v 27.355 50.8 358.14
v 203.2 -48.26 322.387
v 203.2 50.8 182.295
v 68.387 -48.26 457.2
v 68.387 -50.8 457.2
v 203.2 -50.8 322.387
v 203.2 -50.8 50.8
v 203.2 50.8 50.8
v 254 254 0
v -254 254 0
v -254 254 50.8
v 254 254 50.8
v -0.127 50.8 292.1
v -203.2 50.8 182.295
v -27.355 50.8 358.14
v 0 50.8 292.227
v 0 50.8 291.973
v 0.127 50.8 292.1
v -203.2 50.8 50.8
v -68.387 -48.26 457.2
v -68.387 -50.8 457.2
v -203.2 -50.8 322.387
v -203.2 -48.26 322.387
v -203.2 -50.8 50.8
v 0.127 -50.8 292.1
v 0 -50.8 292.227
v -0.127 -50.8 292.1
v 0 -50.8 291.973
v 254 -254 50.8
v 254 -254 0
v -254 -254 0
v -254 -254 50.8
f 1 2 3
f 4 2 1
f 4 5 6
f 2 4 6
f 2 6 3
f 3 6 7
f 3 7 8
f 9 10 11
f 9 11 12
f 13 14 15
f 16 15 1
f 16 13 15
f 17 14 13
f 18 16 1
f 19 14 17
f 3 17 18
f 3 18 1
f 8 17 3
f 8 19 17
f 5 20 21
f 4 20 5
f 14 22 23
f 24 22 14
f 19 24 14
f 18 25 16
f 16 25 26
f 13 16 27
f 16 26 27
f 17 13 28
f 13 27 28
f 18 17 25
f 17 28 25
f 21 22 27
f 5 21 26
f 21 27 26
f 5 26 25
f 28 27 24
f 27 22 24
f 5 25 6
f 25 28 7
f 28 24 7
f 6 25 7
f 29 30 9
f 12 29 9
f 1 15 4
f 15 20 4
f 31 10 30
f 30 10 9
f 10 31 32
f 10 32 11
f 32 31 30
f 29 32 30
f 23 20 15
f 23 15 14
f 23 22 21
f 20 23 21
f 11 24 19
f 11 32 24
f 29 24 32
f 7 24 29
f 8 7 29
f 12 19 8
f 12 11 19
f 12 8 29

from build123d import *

# Parameters (mm, degrees)
F3_W      = 508
F3_H      = 508
F4_DEPTH  = 50.8
F5_W      = 406.4
F5_H      = 101.6
F6_DEPTH  = 406.4
F8_DEPTH  = 304.801
F9_SIZE   = 99.06
F10_SIZE  = 99.06
F15_R     = 0.127
F16_DEPTH = 304.801


with BuildPart() as f4:
    # F3 (on Top) → F4 (new body)
    with BuildSketch(Plane.XY):
        Rectangle(F3_W, F3_H)
    extrude(amount=F4_DEPTH)

    # F5 (on face) → F6 (join)
    with BuildSketch(Plane.XY.offset(50.8)):
        Rectangle(F5_W, F5_H)
    extrude(amount=F6_DEPTH)

    # F7 (on face) → F8 (cut, through all)
    with BuildSketch(Plane.XZ.offset(50.8)):
        Polygon((203.2, 322.3866591478), (203.2, 457.2), (68.3866591478, 457.2), align=None)
        Polygon((-68.3866591478, 457.2), (-203.2, 457.2), (-203.2, 322.3866591478), align=None)
    extrude(amount=-F8_DEPTH, mode=Mode.SUBTRACT)

    # F9
    f9_edges = [f4.edges().sort_by_distance(p)[0] for p in [
        (0, 50.8, 457.2),
    ]]
    chamfer(f9_edges, length=F9_SIZE)

    # F10
    f10_edges = [f4.edges().sort_by_distance(p)[0] for p in [
        (185.32333, 50.8, 340.26333),
        (-185.32333, 50.8, 340.26333),
    ]]
    chamfer(f10_edges, length=F10_SIZE)


with BuildPart() as f4_1:
    # F11: moved
    add(f4.part)


with BuildPart() as f4_2:
    # F14: moved
    add(f4_1.part)

    # F15 (on face) → F16 (cut, through all)
    with BuildSketch(Plane.XZ.offset(50.8)):
        with Locations((0, 292.1)):
            Circle(F15_R)
    extrude(amount=-F16_DEPTH, mode=Mode.SUBTRACT)


solid = f4_2.part
